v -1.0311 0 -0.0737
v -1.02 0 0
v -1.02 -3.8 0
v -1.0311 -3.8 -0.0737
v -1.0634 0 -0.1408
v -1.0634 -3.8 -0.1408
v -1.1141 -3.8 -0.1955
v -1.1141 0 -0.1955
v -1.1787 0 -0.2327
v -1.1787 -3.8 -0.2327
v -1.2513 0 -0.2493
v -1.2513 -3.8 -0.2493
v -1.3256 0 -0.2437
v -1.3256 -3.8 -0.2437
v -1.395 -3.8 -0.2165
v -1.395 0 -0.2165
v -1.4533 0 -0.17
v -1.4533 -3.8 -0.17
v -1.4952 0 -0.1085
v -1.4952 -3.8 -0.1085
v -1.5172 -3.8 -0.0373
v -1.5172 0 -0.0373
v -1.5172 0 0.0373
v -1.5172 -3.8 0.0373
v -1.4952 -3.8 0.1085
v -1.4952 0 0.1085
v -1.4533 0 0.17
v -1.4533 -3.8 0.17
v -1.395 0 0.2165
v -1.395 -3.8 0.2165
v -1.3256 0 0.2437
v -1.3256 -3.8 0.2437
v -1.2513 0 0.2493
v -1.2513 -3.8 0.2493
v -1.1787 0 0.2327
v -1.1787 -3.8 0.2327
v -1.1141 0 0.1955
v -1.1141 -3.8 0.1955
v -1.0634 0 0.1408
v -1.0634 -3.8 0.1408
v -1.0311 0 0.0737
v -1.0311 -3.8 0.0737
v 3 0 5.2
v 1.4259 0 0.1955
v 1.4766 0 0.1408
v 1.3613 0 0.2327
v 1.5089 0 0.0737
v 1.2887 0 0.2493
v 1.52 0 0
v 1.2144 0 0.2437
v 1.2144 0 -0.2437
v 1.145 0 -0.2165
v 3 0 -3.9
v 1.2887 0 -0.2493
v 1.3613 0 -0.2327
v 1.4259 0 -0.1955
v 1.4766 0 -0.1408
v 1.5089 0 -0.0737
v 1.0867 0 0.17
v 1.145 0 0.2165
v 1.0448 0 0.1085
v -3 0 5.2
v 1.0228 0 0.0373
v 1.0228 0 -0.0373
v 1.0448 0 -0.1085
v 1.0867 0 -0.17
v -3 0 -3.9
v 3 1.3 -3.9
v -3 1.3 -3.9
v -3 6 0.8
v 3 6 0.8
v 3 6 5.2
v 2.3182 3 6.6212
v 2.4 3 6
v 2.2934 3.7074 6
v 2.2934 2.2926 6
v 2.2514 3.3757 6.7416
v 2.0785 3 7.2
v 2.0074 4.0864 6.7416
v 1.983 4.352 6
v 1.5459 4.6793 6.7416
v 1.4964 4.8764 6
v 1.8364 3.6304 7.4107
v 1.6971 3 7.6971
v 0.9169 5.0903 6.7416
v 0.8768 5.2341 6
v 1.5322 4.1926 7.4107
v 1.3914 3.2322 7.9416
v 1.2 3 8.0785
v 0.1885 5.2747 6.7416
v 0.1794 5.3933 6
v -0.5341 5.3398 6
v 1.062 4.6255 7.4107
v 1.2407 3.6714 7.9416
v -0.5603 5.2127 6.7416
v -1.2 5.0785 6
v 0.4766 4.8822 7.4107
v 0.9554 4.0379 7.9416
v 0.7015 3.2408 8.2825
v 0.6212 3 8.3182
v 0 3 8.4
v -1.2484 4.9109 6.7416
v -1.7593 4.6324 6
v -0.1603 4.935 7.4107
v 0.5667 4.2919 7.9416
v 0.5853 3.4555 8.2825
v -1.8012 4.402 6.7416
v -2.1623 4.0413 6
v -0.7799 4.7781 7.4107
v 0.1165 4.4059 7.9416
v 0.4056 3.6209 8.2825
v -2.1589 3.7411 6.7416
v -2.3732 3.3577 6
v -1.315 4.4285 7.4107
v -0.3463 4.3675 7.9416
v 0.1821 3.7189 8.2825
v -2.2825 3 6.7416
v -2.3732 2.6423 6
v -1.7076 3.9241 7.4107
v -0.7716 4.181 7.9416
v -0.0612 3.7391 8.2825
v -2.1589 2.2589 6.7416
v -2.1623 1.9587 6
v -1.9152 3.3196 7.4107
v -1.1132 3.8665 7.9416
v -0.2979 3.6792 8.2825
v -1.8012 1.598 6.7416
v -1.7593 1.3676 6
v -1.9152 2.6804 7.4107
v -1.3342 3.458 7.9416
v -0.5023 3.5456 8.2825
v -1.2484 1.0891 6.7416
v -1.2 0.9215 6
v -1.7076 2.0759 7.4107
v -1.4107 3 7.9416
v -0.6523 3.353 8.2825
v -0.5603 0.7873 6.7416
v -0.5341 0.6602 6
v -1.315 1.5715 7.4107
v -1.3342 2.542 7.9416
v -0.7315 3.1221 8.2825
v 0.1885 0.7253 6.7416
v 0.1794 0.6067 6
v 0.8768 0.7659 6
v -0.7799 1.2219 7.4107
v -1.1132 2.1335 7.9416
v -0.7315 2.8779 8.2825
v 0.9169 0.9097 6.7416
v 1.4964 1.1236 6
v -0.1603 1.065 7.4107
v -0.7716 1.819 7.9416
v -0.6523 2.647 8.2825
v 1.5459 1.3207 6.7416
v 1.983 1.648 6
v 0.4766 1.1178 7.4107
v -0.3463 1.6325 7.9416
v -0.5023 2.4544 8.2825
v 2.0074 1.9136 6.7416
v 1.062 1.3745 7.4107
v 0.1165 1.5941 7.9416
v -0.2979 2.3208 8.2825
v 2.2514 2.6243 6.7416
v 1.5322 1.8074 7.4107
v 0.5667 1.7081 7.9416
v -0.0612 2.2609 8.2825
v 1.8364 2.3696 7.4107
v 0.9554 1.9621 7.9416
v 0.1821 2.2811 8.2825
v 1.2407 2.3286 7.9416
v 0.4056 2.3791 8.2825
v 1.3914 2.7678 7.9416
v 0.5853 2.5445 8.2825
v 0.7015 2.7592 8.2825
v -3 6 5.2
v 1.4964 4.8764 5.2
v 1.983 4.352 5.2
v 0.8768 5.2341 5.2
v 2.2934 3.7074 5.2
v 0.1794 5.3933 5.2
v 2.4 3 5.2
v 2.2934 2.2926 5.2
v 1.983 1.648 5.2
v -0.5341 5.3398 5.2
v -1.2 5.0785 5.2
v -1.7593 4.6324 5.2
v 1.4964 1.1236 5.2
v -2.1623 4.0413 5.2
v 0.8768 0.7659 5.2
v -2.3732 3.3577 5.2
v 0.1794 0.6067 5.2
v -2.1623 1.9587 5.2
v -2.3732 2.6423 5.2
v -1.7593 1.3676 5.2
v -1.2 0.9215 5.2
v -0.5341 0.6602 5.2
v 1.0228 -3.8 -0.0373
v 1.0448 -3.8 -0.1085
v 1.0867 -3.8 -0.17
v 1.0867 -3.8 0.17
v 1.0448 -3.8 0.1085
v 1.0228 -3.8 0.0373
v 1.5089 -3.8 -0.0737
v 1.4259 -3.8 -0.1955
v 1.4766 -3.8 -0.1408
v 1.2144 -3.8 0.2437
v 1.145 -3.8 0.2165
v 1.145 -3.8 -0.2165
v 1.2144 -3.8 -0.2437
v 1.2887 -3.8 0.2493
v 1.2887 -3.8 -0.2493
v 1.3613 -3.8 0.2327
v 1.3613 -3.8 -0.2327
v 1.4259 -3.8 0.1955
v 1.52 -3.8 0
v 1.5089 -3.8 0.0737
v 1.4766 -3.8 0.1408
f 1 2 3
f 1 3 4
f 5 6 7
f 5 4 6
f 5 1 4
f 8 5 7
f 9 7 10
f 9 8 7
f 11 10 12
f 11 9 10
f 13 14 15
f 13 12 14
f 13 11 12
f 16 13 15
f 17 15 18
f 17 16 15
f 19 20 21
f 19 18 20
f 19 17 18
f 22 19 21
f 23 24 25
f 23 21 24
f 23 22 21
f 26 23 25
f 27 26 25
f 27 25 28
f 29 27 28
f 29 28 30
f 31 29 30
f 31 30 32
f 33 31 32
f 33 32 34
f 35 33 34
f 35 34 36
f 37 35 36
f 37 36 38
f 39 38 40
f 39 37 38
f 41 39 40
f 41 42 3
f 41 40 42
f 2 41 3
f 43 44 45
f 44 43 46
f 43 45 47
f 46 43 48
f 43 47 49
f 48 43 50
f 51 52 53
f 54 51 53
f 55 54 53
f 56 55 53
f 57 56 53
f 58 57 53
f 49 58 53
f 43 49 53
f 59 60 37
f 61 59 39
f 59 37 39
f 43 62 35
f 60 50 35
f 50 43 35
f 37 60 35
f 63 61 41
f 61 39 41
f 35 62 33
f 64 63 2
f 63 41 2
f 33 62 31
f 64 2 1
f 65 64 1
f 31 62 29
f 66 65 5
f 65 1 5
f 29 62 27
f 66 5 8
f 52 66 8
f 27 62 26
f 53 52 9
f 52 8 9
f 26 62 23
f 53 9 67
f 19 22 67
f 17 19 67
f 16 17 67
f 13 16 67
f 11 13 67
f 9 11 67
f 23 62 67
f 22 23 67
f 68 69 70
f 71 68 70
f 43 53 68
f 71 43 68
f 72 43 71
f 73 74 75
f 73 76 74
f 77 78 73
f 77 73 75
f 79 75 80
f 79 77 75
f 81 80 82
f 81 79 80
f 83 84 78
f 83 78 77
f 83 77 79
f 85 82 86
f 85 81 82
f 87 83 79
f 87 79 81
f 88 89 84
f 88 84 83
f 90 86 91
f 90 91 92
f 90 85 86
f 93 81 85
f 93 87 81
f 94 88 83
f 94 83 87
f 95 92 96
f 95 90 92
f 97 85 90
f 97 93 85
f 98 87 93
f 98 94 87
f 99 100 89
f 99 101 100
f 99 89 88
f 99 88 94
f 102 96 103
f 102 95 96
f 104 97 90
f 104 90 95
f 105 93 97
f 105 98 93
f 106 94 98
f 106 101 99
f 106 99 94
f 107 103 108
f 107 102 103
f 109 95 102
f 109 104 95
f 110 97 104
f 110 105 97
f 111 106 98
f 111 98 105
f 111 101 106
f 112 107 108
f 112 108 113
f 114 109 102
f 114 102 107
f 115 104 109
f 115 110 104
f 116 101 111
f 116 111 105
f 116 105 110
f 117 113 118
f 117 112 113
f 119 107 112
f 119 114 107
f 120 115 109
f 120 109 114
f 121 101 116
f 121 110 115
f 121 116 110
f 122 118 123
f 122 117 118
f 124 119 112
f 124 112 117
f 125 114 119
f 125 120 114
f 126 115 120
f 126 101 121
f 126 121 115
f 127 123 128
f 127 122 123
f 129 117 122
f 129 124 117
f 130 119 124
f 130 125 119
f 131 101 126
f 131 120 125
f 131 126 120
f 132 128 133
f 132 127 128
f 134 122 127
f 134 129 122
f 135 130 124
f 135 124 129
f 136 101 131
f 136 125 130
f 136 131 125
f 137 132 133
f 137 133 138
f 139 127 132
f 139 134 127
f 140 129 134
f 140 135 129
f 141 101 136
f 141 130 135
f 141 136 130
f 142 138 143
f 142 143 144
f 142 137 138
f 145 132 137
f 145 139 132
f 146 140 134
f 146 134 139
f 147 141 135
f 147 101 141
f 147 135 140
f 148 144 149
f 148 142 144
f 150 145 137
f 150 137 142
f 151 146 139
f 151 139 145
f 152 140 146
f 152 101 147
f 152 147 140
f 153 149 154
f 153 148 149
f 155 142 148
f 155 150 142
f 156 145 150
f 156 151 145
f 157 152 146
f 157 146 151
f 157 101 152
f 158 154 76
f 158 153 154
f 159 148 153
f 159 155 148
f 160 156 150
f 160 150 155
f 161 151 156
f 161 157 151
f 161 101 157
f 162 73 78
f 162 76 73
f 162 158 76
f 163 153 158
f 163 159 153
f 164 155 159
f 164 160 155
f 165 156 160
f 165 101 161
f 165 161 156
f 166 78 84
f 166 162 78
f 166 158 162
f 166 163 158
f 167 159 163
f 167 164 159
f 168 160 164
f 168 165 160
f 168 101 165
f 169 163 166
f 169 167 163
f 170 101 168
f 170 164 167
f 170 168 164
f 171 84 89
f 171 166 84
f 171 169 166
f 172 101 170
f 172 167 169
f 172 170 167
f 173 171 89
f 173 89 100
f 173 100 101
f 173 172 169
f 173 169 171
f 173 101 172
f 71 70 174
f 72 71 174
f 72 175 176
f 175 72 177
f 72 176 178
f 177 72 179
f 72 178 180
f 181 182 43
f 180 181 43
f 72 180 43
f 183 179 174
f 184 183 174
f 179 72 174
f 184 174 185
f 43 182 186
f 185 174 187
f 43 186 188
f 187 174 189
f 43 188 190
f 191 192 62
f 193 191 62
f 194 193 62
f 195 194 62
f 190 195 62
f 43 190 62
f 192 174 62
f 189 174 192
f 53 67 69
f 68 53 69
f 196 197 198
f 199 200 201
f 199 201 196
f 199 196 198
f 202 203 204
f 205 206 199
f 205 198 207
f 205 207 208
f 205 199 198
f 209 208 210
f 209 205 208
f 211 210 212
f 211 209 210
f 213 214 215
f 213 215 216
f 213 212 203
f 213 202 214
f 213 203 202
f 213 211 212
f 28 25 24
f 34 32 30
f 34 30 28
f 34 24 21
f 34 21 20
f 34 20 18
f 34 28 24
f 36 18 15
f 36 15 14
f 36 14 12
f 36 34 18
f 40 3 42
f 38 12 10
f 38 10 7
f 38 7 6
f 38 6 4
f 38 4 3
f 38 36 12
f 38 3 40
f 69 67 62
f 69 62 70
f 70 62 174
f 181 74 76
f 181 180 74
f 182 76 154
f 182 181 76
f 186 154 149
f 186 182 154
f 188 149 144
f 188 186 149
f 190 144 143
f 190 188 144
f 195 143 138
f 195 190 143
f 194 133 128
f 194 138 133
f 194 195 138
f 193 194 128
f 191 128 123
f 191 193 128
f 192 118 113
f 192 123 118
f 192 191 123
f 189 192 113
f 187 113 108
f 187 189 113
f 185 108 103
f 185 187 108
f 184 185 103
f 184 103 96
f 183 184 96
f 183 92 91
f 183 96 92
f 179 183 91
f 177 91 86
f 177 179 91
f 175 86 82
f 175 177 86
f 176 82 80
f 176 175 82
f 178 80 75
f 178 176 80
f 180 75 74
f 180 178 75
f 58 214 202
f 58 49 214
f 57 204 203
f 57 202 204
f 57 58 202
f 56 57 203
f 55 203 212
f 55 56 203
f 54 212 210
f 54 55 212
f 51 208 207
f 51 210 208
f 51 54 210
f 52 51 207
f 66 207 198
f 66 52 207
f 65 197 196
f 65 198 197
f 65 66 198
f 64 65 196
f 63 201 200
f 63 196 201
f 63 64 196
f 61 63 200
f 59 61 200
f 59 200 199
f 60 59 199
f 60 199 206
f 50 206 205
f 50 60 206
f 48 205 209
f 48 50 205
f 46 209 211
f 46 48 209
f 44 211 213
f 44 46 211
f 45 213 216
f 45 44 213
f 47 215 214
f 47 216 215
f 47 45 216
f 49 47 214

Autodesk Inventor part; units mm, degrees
ref_plane "YZ Plane" through (0, 0, 0) normal (1, 0, 0) x (0, 1, 0)
ref_plane "XZ Plane" through (0, 0, 0) normal (0, 1, 0) x (-1, 0, 0)
ref_plane "XY Plane" through (0, 0, 0) normal (0, 0, 1) x (1, 0, 0)
sketch "Sketch1" plane through (0, 0, 0) normal (1, 0, 0) x (0, 1, 0)
  line L0 (0, 5.2) -> (0, -3.9)
  line L1 (0, -3.9) -> (1.3, -3.9)
  line L2 (1.3, -3.9) -> (6, 0.8)
  line L3 (6, 0.8) -> (6, 5.2)
  line L4 (6, 5.2) -> (0, 5.2)
  point P0 (0, 0)
  dimension "d0" = 9.1
  dimension "d1" = 6
  dimension "d2" = 0
  dimension "d3" = 5.2
  dimension "d4" = 1.3
  dimension "d5" = 45
extrude "Extrusion1" add sketch "Sketch1" along normal mid plane 6
sketch "Sketch2" plane through (-3, 0, 5.2) normal (0, 0, 1) x (1, 0, 0)
  circle A0 centre (3, 3) radius 2.4
  point P0 (3, 0)
  dimension "d8" = 4.8
extrude "Extrusion2" add sketch "Sketch2" along normal blind 3.2
fillet "Fillet1" radius 2.4 1 edges at (-2.4, 3, 8.4)
sketch "Sketch3" plane through (-3, 0, -3.9) normal (0, -1, 0) x (1, 0, 0)
  circle A0 centre (1.73, 3.9) radius 0.25
  circle A1 centre (4.27, 3.9) radius 0.25
  point P0 (3, 3.9)
  dimension "d12" = 0.5
  dimension "d13" = 0.5
  dimension "d14" = 2.54
  dimension "d15" = 1.27
  dimension "d16" = 0
  dimension "d17" = 0
extrude "Extrusion3" add sketch "Sketch3" along normal blind 3.8
equation "\"d15\" = 0.5 * d14"
properties part number "Multicomp-2118128"
